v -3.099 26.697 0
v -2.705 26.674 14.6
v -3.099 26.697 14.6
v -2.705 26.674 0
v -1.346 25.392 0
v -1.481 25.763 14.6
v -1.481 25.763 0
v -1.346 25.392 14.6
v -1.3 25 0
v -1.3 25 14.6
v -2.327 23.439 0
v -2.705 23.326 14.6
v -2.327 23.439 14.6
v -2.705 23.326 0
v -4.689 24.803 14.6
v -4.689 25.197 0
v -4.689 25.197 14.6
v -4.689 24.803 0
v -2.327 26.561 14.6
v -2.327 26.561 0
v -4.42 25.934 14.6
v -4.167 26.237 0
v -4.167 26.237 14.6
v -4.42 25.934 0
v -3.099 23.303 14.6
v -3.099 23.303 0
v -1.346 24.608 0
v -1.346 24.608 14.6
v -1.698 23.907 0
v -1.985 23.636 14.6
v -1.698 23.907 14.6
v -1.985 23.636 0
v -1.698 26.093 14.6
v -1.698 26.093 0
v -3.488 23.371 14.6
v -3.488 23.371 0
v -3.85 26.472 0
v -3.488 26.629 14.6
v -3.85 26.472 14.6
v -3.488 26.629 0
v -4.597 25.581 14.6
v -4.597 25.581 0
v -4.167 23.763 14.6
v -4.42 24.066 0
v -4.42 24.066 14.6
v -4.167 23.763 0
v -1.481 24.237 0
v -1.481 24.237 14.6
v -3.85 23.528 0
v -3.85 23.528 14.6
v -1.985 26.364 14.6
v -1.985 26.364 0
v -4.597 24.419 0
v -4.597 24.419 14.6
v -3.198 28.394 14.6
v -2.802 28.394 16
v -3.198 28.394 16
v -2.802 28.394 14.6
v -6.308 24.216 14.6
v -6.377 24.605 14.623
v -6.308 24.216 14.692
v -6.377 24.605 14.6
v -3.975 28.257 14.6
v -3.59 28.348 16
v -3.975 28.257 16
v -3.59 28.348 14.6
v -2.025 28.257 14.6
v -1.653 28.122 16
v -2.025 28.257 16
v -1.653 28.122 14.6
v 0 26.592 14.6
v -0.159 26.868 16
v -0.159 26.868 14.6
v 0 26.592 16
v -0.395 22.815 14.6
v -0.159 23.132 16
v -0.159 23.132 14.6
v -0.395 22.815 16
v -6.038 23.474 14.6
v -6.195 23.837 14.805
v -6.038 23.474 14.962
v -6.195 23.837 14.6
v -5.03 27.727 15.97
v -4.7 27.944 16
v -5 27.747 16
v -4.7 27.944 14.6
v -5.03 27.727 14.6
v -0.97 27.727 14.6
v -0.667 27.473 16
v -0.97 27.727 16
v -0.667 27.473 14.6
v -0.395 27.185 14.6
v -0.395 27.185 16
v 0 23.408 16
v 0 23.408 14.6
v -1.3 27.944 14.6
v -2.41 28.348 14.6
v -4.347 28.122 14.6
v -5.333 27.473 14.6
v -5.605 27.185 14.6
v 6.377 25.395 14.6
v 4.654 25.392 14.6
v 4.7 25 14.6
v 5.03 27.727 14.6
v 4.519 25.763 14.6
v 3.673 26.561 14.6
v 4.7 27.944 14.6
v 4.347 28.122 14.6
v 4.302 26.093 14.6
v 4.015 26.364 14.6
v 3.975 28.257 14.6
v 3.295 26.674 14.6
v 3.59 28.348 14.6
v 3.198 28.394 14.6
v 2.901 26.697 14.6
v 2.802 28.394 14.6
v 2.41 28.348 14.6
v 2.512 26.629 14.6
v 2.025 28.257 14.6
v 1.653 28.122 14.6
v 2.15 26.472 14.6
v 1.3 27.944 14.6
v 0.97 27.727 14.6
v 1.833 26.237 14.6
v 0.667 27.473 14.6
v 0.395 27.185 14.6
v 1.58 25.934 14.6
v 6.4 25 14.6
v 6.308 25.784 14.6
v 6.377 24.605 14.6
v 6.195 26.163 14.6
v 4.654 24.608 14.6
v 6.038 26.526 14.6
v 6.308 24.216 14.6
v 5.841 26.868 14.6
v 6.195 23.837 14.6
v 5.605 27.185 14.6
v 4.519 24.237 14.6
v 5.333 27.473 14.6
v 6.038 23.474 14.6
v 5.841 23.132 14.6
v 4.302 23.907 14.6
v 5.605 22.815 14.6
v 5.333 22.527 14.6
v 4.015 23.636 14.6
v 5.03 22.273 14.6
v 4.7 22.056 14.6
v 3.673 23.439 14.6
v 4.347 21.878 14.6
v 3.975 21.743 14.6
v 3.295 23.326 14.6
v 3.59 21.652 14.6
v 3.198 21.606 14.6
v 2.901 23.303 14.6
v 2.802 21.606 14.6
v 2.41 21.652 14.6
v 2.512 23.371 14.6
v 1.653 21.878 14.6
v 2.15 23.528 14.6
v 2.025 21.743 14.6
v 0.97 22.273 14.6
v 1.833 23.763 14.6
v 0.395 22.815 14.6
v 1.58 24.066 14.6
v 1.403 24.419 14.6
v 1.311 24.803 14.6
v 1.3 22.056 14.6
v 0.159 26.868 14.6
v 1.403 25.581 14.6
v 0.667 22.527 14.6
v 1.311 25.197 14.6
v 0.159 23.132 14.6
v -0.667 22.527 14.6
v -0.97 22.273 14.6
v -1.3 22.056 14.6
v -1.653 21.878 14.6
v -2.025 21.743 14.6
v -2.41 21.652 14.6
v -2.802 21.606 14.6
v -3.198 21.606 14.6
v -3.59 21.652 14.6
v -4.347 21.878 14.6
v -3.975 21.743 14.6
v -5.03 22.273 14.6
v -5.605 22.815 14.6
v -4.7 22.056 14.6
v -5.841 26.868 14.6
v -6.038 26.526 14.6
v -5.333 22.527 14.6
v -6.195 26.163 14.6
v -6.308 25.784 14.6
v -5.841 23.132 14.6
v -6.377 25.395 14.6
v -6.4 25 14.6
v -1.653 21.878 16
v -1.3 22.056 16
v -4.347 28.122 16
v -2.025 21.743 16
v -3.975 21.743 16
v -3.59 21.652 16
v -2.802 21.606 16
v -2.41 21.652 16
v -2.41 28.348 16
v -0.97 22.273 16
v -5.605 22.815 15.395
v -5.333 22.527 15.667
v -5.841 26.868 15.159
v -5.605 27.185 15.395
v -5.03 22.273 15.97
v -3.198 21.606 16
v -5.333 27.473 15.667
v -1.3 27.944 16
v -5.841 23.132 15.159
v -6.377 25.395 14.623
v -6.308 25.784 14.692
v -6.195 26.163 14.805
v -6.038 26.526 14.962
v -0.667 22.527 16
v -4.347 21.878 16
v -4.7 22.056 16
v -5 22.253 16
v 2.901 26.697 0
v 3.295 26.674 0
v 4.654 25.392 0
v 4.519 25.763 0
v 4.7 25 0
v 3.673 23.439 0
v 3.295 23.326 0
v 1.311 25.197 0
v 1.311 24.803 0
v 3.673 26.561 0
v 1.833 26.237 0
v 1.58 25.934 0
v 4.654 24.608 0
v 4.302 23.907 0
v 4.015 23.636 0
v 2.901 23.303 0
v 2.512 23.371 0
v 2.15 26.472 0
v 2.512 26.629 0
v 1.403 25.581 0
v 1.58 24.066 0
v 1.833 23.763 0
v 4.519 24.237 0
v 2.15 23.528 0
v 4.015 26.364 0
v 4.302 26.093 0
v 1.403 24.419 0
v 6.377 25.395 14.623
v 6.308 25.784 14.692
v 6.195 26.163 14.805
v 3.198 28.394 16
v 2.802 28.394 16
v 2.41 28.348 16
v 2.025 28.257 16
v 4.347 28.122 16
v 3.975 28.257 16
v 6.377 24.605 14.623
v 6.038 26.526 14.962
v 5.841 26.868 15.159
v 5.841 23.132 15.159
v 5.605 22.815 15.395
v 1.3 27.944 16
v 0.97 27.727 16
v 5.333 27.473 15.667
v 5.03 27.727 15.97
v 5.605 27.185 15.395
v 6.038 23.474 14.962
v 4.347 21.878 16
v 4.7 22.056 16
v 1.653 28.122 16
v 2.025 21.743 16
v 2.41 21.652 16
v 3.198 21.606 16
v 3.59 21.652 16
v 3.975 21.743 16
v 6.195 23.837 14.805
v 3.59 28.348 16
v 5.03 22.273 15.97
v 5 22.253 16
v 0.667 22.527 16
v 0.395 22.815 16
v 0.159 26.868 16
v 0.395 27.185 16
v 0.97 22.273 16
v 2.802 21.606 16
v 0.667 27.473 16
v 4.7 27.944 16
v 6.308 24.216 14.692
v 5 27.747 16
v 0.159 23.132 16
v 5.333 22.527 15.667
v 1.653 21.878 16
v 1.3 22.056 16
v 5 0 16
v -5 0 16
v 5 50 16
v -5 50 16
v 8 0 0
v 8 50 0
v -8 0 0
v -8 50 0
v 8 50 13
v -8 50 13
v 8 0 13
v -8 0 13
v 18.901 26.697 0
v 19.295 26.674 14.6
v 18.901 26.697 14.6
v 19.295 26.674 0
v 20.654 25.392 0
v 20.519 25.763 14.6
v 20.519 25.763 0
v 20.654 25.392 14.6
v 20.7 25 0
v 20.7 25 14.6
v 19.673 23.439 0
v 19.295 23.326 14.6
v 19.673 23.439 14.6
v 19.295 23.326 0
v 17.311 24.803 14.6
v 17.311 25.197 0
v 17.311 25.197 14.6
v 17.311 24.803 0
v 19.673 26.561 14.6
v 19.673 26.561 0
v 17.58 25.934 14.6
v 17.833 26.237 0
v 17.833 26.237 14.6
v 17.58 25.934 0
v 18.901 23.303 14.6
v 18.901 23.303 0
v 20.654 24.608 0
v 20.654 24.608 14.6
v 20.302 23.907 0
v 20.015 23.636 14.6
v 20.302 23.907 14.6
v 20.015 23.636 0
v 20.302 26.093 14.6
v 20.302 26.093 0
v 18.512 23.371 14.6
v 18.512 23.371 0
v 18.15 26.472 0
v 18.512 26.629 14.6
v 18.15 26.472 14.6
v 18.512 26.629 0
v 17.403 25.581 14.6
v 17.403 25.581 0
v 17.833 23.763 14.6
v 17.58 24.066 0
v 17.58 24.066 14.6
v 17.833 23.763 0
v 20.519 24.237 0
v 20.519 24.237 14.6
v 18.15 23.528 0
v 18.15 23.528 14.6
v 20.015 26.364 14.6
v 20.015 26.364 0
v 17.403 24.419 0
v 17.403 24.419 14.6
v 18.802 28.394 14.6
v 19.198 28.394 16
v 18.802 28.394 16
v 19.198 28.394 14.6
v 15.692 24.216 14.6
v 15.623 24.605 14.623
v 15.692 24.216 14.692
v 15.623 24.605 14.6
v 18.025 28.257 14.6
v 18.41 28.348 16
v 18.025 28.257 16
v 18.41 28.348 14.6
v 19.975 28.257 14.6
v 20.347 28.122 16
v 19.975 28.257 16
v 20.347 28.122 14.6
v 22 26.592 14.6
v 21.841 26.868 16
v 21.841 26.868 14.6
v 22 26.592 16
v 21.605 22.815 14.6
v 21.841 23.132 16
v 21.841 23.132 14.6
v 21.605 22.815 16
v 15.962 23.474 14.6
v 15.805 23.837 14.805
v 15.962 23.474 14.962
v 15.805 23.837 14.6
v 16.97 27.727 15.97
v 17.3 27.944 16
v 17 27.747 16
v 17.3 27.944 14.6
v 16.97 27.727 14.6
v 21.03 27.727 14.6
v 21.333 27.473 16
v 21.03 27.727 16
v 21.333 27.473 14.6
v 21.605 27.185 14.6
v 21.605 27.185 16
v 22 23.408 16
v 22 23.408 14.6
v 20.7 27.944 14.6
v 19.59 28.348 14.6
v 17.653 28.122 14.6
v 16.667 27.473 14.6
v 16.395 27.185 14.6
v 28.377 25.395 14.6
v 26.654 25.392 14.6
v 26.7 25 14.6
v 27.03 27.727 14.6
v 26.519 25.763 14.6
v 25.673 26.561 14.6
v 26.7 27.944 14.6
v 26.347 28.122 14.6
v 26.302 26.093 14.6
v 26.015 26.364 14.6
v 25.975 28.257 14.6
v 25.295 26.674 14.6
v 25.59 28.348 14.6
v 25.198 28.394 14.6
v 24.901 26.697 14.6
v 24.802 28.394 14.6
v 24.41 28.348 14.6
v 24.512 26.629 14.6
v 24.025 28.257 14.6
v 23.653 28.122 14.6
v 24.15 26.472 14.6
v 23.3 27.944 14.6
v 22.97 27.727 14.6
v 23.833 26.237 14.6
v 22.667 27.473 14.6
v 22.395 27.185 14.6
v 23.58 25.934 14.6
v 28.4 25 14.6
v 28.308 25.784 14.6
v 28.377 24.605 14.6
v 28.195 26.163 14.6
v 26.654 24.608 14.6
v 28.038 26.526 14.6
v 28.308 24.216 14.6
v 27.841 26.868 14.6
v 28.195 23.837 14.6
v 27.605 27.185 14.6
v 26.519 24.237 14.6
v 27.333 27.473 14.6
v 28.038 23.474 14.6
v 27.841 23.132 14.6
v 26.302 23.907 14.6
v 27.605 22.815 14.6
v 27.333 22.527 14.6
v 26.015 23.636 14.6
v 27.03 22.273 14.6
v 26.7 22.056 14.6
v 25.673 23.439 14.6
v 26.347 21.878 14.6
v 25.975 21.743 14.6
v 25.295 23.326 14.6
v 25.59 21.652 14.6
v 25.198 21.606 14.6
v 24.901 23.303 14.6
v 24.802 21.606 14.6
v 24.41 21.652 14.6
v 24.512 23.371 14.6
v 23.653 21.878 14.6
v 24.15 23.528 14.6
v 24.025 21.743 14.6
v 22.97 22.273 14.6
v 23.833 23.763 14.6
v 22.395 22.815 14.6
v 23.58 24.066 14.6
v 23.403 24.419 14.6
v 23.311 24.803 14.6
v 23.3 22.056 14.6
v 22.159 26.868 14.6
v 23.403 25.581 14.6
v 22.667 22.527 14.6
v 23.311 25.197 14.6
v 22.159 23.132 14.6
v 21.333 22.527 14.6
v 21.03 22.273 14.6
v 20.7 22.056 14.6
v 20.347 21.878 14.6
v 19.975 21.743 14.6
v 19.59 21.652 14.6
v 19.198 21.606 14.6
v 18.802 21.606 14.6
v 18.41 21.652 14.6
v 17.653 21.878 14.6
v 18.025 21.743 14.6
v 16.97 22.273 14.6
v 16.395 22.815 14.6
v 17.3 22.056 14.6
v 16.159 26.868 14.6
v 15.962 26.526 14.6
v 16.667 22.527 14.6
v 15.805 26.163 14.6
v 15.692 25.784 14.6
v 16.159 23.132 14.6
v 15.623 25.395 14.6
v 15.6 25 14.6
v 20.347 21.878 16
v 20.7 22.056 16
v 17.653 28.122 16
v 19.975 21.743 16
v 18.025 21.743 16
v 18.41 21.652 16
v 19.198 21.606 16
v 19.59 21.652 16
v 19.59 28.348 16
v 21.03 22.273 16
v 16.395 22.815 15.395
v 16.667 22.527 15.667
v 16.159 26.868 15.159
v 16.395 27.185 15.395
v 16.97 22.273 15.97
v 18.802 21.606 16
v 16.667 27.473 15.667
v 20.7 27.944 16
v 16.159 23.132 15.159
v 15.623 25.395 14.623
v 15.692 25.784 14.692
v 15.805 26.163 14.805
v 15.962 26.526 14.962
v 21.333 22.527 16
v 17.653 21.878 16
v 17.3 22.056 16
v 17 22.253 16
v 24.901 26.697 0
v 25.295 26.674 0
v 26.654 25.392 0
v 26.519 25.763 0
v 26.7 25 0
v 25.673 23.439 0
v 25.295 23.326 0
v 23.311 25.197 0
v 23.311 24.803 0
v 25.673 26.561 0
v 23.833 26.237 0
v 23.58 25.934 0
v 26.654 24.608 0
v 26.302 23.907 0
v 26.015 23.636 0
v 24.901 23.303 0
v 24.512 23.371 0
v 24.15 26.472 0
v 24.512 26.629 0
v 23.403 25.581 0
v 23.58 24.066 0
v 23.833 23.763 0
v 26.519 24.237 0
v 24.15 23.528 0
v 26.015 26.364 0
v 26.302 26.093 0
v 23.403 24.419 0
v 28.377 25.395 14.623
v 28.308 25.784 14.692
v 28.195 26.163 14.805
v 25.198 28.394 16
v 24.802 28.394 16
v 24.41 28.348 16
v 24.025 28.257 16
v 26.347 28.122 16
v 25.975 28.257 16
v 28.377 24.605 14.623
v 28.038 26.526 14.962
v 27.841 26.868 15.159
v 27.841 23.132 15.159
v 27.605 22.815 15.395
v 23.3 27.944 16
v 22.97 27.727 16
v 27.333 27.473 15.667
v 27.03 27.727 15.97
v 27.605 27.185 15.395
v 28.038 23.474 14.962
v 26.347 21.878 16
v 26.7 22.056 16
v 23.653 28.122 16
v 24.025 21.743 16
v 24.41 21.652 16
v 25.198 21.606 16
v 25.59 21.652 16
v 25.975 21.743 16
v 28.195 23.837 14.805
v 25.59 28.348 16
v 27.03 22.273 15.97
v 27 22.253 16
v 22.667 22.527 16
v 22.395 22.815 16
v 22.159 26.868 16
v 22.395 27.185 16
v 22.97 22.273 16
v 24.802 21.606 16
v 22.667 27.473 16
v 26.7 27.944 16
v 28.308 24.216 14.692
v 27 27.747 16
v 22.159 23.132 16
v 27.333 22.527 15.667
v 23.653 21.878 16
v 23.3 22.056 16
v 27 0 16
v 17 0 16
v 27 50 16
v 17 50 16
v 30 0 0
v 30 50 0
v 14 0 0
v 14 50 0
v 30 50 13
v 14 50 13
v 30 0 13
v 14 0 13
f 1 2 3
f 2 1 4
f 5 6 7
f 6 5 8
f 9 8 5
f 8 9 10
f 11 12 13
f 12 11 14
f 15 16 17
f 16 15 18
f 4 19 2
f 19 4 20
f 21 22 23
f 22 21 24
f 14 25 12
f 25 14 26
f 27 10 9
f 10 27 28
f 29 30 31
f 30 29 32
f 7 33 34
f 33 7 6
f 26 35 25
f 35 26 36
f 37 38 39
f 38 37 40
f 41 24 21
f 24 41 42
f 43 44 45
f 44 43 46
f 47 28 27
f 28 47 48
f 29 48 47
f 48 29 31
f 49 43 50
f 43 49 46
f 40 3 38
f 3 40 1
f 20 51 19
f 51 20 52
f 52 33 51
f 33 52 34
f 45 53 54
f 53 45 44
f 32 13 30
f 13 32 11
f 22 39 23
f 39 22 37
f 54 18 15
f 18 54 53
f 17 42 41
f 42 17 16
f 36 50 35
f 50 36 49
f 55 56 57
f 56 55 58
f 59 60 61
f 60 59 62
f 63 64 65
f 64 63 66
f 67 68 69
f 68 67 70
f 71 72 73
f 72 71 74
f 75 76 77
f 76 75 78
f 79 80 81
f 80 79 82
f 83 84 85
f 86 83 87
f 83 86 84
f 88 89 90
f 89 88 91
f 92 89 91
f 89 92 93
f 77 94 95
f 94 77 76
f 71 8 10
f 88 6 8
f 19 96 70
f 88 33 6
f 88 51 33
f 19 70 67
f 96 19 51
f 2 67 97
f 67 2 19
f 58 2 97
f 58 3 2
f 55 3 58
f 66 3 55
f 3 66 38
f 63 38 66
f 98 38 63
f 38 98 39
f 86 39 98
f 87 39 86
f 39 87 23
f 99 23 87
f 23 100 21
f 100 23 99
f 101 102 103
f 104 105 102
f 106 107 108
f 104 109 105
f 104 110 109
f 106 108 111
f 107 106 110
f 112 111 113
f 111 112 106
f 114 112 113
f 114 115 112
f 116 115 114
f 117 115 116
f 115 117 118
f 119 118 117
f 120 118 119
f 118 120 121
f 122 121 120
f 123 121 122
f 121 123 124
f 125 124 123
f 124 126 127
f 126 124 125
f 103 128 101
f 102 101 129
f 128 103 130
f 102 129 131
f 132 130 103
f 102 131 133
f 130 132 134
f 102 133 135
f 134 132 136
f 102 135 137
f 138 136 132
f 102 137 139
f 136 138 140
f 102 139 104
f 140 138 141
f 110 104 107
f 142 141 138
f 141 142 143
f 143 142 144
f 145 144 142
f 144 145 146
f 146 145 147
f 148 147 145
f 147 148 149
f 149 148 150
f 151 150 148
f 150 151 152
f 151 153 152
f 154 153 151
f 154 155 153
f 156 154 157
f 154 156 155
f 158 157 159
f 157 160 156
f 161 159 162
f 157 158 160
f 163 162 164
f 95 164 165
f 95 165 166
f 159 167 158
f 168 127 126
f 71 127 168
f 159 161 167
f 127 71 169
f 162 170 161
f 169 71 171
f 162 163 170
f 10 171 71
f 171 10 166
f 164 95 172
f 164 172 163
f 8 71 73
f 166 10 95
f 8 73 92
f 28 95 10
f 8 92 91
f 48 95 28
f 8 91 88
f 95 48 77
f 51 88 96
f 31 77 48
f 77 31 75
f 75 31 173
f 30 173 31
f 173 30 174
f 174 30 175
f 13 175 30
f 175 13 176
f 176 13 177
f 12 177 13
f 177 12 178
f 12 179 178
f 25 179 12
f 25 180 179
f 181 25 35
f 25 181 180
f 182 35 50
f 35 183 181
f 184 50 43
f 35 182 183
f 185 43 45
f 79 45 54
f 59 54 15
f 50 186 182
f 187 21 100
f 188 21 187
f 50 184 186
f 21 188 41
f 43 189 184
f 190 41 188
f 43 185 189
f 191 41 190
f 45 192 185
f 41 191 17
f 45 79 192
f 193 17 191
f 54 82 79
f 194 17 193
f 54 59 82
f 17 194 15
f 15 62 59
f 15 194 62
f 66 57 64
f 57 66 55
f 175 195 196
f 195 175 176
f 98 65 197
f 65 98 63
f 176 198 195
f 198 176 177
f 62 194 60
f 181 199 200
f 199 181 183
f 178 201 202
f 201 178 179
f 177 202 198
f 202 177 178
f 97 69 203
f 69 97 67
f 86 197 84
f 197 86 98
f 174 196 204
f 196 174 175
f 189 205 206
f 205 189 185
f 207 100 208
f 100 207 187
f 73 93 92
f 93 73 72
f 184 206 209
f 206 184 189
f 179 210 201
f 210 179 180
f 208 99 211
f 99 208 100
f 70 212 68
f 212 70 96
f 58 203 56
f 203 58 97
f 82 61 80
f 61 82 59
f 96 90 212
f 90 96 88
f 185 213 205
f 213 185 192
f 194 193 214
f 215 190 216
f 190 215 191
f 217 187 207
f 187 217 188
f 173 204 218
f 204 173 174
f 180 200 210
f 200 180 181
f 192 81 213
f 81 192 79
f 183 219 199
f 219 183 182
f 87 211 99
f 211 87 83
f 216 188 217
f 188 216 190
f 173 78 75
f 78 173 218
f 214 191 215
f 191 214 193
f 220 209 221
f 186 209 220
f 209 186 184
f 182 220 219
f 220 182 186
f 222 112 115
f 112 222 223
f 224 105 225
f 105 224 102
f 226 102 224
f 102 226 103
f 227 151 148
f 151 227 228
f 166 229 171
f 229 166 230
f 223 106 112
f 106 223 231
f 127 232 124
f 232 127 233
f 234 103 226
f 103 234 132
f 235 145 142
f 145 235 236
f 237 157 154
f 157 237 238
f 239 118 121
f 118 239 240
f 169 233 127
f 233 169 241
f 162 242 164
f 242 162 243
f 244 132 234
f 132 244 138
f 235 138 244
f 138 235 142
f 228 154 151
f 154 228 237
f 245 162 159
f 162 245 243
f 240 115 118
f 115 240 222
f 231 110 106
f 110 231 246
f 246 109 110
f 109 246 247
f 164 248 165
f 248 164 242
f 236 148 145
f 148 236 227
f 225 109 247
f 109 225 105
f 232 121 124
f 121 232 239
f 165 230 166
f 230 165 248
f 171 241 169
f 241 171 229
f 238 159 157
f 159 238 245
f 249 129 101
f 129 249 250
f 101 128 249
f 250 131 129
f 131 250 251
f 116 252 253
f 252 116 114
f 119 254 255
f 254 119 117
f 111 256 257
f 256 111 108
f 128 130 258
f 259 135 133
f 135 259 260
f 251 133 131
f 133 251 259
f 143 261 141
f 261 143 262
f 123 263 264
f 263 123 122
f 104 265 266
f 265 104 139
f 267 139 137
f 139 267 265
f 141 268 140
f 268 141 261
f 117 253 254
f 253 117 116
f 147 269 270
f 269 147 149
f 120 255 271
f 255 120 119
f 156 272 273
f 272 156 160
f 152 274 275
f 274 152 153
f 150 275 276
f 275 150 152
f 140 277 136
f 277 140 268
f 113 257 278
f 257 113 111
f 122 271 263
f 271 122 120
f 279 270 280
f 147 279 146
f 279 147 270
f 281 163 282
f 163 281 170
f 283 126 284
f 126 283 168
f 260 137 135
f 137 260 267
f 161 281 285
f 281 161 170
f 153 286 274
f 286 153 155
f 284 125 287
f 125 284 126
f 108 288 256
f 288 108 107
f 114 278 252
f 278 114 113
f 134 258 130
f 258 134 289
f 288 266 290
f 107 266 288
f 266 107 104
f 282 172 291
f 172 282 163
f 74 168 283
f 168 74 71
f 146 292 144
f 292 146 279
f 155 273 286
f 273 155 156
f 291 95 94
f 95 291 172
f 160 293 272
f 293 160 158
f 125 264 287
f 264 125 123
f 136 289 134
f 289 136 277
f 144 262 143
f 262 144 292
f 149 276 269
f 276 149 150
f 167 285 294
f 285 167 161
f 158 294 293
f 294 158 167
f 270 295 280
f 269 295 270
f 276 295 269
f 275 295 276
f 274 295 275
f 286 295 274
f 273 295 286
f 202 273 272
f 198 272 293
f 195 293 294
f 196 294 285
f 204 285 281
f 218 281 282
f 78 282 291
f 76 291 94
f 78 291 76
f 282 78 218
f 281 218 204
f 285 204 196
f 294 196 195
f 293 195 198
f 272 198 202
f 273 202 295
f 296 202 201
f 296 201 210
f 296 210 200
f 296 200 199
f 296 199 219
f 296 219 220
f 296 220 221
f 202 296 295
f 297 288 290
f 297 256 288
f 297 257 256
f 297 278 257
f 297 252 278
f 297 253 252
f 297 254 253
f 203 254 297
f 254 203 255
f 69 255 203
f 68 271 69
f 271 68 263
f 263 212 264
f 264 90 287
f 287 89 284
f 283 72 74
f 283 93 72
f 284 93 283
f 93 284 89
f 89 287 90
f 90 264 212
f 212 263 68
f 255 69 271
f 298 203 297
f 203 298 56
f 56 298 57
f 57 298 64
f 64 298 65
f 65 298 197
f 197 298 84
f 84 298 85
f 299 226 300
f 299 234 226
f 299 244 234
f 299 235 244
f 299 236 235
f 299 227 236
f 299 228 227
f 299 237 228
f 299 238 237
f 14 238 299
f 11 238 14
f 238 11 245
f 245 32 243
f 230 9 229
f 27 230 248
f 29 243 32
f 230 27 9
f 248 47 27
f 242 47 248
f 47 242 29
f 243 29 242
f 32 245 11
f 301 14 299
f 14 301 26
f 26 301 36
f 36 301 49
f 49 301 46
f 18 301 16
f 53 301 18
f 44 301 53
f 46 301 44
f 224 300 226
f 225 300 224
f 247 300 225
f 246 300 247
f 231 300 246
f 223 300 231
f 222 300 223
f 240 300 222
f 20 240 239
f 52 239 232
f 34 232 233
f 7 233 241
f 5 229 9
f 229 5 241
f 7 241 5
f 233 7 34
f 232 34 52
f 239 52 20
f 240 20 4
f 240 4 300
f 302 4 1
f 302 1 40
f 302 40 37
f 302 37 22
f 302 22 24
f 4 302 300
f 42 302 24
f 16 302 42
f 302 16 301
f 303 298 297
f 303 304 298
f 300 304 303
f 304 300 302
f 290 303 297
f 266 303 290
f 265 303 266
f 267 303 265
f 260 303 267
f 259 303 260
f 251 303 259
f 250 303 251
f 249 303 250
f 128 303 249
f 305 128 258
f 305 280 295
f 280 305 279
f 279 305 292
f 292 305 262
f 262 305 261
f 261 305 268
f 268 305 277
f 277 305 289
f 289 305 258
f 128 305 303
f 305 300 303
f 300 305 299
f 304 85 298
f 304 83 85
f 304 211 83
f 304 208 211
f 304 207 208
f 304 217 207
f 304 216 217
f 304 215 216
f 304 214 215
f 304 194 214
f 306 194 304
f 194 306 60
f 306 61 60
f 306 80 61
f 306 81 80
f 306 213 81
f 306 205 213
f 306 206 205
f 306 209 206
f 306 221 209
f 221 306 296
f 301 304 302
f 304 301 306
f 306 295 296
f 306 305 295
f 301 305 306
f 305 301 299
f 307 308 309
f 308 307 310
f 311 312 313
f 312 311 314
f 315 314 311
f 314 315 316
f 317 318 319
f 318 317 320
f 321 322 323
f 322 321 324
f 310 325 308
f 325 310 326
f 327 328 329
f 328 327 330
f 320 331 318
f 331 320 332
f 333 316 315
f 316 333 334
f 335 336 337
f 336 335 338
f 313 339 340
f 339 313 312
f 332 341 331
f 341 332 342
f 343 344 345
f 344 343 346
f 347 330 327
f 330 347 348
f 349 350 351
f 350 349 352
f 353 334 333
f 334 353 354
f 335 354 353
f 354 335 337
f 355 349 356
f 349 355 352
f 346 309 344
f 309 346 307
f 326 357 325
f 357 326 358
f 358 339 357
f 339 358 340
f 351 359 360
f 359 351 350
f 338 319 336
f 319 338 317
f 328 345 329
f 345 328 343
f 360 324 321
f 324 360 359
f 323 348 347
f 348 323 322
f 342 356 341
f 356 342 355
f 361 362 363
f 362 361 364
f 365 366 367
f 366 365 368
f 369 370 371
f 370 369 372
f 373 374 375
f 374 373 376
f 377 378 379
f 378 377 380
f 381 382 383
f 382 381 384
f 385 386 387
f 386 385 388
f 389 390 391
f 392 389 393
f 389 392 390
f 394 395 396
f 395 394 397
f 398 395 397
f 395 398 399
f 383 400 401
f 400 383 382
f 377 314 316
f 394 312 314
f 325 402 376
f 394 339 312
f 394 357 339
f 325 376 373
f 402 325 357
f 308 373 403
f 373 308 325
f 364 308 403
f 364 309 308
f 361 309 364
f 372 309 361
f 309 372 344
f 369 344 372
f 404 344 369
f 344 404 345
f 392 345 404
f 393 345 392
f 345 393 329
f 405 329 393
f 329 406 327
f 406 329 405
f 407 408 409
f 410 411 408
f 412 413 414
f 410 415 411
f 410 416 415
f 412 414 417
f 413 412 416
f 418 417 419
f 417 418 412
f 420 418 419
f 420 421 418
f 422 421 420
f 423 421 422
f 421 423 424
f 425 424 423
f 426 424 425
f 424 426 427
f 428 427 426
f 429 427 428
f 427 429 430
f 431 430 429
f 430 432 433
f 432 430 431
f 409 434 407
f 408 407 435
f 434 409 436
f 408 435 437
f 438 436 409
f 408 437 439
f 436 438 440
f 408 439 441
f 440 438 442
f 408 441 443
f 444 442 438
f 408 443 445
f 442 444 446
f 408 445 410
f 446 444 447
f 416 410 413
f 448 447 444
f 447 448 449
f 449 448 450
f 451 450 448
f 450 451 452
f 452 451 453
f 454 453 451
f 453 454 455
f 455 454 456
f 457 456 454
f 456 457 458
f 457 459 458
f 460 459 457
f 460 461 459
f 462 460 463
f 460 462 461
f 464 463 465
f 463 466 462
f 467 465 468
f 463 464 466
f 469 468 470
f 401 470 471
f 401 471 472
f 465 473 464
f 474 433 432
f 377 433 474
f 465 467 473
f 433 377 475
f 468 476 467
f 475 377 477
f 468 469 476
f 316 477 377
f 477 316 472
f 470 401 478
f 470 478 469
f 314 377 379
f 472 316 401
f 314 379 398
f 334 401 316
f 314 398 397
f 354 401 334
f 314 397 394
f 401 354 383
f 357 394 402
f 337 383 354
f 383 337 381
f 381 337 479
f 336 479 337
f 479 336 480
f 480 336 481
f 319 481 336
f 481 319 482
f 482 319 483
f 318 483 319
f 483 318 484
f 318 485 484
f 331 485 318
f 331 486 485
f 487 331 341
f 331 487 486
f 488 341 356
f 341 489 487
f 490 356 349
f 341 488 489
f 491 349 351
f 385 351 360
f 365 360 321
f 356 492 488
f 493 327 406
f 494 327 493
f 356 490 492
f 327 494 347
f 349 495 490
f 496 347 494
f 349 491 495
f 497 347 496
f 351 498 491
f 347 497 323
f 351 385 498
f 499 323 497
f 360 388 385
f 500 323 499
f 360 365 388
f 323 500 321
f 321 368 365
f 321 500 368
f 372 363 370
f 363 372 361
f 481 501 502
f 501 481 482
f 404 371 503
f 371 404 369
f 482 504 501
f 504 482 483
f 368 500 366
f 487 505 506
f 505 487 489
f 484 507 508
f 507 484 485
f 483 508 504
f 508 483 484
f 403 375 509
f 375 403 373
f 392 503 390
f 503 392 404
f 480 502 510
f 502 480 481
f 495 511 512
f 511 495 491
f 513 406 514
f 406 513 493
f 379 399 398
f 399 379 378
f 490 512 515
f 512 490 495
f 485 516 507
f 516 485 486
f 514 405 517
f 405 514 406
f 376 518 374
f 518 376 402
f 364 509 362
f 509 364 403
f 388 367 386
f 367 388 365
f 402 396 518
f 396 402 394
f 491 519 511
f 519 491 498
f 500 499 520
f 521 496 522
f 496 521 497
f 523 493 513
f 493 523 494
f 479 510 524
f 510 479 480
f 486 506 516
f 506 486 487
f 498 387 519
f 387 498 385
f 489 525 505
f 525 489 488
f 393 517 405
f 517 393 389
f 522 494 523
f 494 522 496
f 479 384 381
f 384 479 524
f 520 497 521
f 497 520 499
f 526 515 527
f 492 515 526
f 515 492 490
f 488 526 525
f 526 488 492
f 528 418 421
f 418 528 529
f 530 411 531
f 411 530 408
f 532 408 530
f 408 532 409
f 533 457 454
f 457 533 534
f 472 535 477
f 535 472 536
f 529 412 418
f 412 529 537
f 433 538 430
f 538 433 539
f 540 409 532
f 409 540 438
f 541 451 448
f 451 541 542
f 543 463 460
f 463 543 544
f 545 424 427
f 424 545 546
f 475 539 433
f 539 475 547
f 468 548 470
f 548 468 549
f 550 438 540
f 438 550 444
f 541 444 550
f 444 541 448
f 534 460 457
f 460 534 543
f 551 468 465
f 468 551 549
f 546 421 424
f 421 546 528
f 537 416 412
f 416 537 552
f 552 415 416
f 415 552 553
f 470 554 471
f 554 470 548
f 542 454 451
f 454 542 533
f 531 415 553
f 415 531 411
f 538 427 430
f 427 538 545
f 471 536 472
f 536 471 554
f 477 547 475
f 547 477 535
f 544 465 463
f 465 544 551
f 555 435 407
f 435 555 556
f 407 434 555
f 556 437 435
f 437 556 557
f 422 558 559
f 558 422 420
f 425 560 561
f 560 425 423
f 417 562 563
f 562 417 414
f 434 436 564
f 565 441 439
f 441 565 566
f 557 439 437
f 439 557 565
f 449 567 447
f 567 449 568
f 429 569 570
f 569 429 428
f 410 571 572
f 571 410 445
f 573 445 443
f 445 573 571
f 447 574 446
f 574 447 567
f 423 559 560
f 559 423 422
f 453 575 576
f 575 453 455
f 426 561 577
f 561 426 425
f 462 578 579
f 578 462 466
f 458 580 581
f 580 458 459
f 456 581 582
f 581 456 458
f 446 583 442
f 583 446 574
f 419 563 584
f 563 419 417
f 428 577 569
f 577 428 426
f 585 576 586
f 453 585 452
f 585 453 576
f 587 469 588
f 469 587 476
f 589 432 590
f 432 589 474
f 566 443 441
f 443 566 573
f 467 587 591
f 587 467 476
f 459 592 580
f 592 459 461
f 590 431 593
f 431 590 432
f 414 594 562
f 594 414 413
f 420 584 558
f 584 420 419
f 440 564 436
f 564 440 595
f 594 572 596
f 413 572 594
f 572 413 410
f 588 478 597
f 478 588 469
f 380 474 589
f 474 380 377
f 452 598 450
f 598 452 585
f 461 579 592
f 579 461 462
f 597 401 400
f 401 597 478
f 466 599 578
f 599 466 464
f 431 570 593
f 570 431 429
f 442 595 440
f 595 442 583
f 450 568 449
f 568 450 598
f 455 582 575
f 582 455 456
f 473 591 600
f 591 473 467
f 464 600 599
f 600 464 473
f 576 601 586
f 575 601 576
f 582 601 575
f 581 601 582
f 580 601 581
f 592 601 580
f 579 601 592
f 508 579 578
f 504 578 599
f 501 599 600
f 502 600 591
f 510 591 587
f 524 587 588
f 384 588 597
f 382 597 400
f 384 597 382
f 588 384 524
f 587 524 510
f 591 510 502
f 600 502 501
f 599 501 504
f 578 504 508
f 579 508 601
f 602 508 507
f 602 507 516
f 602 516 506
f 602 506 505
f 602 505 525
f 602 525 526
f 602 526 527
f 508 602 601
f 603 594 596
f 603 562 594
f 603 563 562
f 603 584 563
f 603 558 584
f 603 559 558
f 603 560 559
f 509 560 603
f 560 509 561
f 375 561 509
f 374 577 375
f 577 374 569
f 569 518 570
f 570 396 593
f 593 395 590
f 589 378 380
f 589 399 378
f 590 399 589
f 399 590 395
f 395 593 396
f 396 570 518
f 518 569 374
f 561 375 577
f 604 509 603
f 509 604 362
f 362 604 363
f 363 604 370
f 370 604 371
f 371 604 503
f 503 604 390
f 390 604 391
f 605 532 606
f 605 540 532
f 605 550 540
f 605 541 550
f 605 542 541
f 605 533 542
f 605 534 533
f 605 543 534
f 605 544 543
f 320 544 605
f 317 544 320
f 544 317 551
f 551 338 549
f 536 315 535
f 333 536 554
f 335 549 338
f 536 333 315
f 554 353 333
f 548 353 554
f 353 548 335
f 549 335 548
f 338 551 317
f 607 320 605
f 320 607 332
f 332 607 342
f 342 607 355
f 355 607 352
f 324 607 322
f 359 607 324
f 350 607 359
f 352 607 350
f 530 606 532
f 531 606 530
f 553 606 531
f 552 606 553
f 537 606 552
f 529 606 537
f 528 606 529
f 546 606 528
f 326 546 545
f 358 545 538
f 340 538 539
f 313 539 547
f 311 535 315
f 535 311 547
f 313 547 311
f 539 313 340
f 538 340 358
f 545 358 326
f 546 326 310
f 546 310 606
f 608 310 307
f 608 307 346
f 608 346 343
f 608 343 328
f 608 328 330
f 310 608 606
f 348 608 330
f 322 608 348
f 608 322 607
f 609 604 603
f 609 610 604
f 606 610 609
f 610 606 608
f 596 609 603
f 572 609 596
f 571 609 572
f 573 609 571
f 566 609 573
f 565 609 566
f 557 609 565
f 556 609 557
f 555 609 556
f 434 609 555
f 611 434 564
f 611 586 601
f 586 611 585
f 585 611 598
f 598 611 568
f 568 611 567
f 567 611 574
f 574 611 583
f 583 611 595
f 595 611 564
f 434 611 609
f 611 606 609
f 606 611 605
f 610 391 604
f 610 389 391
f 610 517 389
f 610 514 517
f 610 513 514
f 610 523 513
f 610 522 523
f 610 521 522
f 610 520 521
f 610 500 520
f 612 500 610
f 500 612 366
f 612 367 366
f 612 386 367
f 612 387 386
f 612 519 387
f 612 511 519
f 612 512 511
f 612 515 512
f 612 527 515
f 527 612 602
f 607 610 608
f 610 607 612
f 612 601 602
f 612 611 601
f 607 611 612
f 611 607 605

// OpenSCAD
/* =====================================================
   Compute bay kit — UniFi Toolless Mini Rack
   =====================================================
   Parts for laying out the compute bay (the 3U on the fixed
   shelf, UACC-Rack-Shelf-TL) flat, in two rows with air
   between everything:

     front row  GMKtec M8 · two Mac mini M4 stacked on a
                riser · Mac mini M4
     back row   Geekom A9 Mega · Minisforum MS-A2

   The power bricks and the HDHomeRun live in the brick caddy
   at the bottom back of the rack (rack_brick_caddy.scad).

   Why this layout: the fan lid's fans and clips hang 18.2 mm
   into the bay, so under a fan there's about 122 mm, not
   141. An M8 on a bridge over the MS-A2 would stand 134 mm.
   Two minis stacked with a 10 mm gap stand 116 mm, and the
   freed spot takes the M8 flat. Also, the rack's side
   ledges stick 19.7 mm in at every 48 mm, so nothing taller
   than 46 mm may come within 22 mm of a side slat (the
   ledge plus a cable clip's spine): every device stays
   inside |x| ≤ 199.5.

   Parts:
     fin     spacer between two front-row devices (17 mm
             gap), pinned into the shelf's perforations
     deck    the riser's top: carries the upper Mac mini on
             two ribs under its foot, so the intake ring
             round the foot stays open; corner lips locate it
     post    four legs for the deck, standing outside the
             lower mini's corners
     clip    a cable clip that pushes onto a side ledge and
             holds a bundle in the 19.7 mm band between the
             ledge edge and the slat, out of the airflow
     pins    loose pins for the fins (the shelf's holes are
             Ø3.5 on a 6.0 × 5.2 staggered grid)

   Coordinates: X across the rack (centred), Y back from the
   front of the shelf, Z up from the shelf top.
   ===================================================== */

$fa = 2;
$fs = 0.4;

/* ── Selection (set by presets) ─────────────────────── */
part = "fins";      // [fins, deck, posts, clips, pins, fit_test, none]

/* ── Devices (mm: width × depth × height) ───────────── */
mini   = [127, 127, 50];      // Mac mini M4
m8     = [110, 110, 65];      // GMKtec NucBox M8
a9     = [171, 171, 71];      // Geekom A9 Mega
msa2   = [196, 189, 48];      // Minisforum MS-A2

/* ── Layout (bay frame) ─────────────────────────────── */
gap      = 17;                // between front-row devices (a fin's width + 1)
row_x0   = -71.5;             // left edge of the stacked minis
row_y    = 76;                // front row's front edge (inside the perforated field)
channel  = 26;                // air channel between the rows (the back row then
                              // ends 42 mm short of the shelf's back, clear of
                              // the AC Infinity, 38 mm deep)
back_gap = 30;                // between the A9 and the MS-A2
side_max = 199.5;             // nothing tall beyond this |x|

/* ── Fin ────────────────────────────────────────────── */
fin_w    = gap - 1;           // 16
fin_len  = 50;
fin_h    = 16;
fin_cham = 3;

/* ── Riser ──────────────────────────────────────────── */
riser_gap  = 10;              // lower mini top to deck underside
mini_clear = 1.0;             // per side, round the minis
post_w     = 8;
rail_w     = 8;
rail_h     = 4;
rib_w      = 8;
rib_h      = 6;               // ribs stand 2 mm proud of the rails
rib_x      = 26;              // ribs at ±26: under the M4's foot
lip_h      = 4;
lip_len    = 18;
lip_t      = 2.4;
peg_d      = 4.0;
peg_len    = 4;
peg_clear  = 0.2;

/* ── Ledge clip ─────────────────────────────────────── */
ledge_t     = 1.65;
ledge_in    = 19.7;           // ledge edge to slat
clip_v      = 12;             // clip thickness along the ledge
spine_t     = 2;
jaw_len     = 11;
jaw_t       = 2.4;
jaw_gap     = 1.85;           // ledge 1.65 + a little (1.75 spread the jaws)
bump        = 0.1;            // friction bump on the top jaw (0.25 printed tight)
hook_u      = 8.8;            // hook centre out from the ledge edge (ring
                              // stays inside the 19.7 mm band)
hook_z      = -15;            // hook centre below the ledge top
hook_r      = 8;              // inner radius: a bundle up to ~16 mm
hook_wall   = 2;
hook_mouth  = 7;              // opening at the bottom, toward the wall

/* ── Shelf pins (same as unifi_shelf_dock) ──────────── */
hole_pitch = 6.0;
pin_d      = 3.1;
pin_hole   = 3.4;
pin_head_d = 6.2;
pin_head_t = 1.2;
cbore_d    = 6.8;
cbore_t    = 1.4;
pin_peg    = 4.0;             // how far a pin pokes below the part (into the shelf)
pin_count  = 6;

eps = 0.01;

/* ── Derived layout ─────────────────────────────────── */
stack_x  = row_x0 + mini[0] / 2;                     // stacked minis' centre
m8_x     = row_x0 - gap - m8[0] / 2;
mini_x   = row_x0 + mini[0] + gap + mini[0] / 2;
fin_x    = [row_x0 - gap / 2, row_x0 + mini[0] + gap / 2];
back_y   = row_y + mini[1] + channel;
a9_x     = -side_max + a9[0] / 2 + 1;
msa2_x   = a9_x + a9[0] / 2 + back_gap + msa2[0] / 2;
deck_in  = mini[0] / 2 + mini_clear;                 // half-width inside the posts
deck_out = deck_in + post_w;
deck_z   = mini[2] + riser_gap;                      // deck underside
upper_z  = deck_z + rib_h;                           // where the upper mini sits

/* ── Fin ────────────────────────────────────────────── */
module fin() {
    difference() {
        hull() {
            translate([-fin_w / 2, 0, 0]) cube([fin_w, fin_len, fin_h - fin_cham]);
            translate([-fin_w / 2 + fin_cham, 0, 0]) cube([fin_w - 2 * fin_cham, fin_len, fin_h]);
        }
        // two pins on one perforation row, one hole pitch apart
        for (x = [-hole_pitch / 2, hole_pitch / 2]) translate([x, fin_len / 2, 0]) {
            translate([0, 0, -1]) cylinder(d = pin_hole, h = fin_h + 2);
            translate([0, 0, fin_h - cbore_t]) cylinder(d = cbore_d, h = cbore_t + 1);
        }
    }
}

/* ── Riser ──────────────────────────────────────────── */
// Deck, as printed: rails and ribs on the bed, lips up. In place it's
// the same way up (z = 0 here is the deck's underside).
module deck() {
    difference() {
        union() {
            // perimeter rails over the posts
            difference() {
                translate([-deck_out, -deck_out, 0]) cube([2 * deck_out, 2 * deck_out, rail_h]);
                translate([-deck_in, -deck_in, -1]) cube([2 * deck_in, 2 * deck_in, rail_h + 2]);
            }
            // two ribs under the upper mini's foot
            for (x = [-rib_x, rib_x]) translate([x - rib_w / 2, -deck_in - eps, 0])
                cube([rib_w, 2 * deck_in + 2 * eps, rib_h]);
            // corner lips locate the upper mini
            for (sx = [-1, 1], sy = [-1, 1]) mirror([sx < 0 ? 1 : 0, 0, 0]) mirror([0, sy < 0 ? 1 : 0, 0]) {
                translate([deck_in, deck_in - lip_len, 0]) cube([lip_t, lip_len, rib_h + lip_h]);
                translate([deck_in - lip_len, deck_in, 0]) cube([lip_len + lip_t, lip_t, rib_h + lip_h]);
            }
        }
        // sockets for the post pegs
        for (sx = [-1, 1], sy = [-1, 1])
            translate([sx * (deck_in + post_w / 2), sy * (deck_in + post_w / 2), -1])
                cylinder(d = peg_d + 2 * peg_clear, h = peg_len + 1.5);
    }
}

// A post, standing: it reaches the deck's underside and pegs into it.
module post() {
    translate([-post_w / 2, -post_w / 2, 0]) cube([post_w, post_w, deck_z]);
    translate([0, 0, deck_z - eps]) cylinder(d = peg_d, h = peg_len + eps);
}

/* ── Ledge clip ─────────────────────────────────────── */
// Profile in (u, z): u out from the ledge edge toward the slat, z up
// from the ledge top. Extruded clip_v along the ledge.
module clip_profile() {
    difference() {
        union() {
            // spine, just inside the ledge edge
            let(z0 = hook_z - hook_r - hook_wall, z1 = jaw_gap + jaw_t)
                translate([-spine_t, z0]) square([spine_t, z1 - z0]);
            // top jaw (over the ledge) with its friction bump
            translate([0, jaw_gap]) square([jaw_len, jaw_t]);
            translate([jaw_len - 3, jaw_gap - bump]) square([2, bump + eps]);
            // bottom jaw
            translate([0, -jaw_t]) square([jaw_len, jaw_t]);
            // hook ring
            translate([hook_u, hook_z]) circle(r = hook_r + hook_wall);
            // web from the spine to the ring
            translate([-spine_t, hook_z]) square([hook_u, hook_r + hook_wall]);
        }
        translate([hook_u, hook_z]) circle(r = hook_r);
        // mouth: open at the bottom, toward the wall, so a bundle pushes in
        translate([hook_u, hook_z]) rotate(-60) translate([0, -hook_mouth / 2]) square([hook_r + hook_wall + 1, hook_mouth]);
        // keep the ring clear of the slat
        translate([ledge_in - 0.8, -60]) square([10, 80]);
    }
}

module clip() { linear_extrude(clip_v) clip_profile(); }

/* ── Pins ───────────────────────────────────────────── */
// The shaft starts under the head: it spans the fin below the
// counterbore, then pokes pin_peg out the bottom, tapered at the tip.
module pin() {
    shaft = fin_h - cbore_t + pin_peg;
    cylinder(d = pin_head_d, h = pin_head_t);
    translate([0, 0, pin_head_t - eps]) {
        cylinder(d = pin_d, h = shaft - 0.5 + eps);
        translate([0, 0, shaft - 0.5]) cylinder(d1 = pin_d, d2 = pin_d - 1, h = 0.5);
    }
}

/* ── Layout helpers (scenes include this file) ──────── */
module at_fins() {
    for (x = fin_x) for (y = [row_y + (mini[1] - fin_len) / 2]) translate([x, y, 0]) children();
}

module riser_in_place() {
    translate([stack_x, row_y + mini[1] / 2, 0]) {
        for (sx = [-1, 1], sy = [-1, 1])
            translate([sx * (deck_in + post_w / 2), sy * (deck_in + post_w / 2), 0]) post();
        translate([0, 0, deck_z]) deck();
    }
}

/* ── Fit test ───────────────────────────────────────── */
module fit_test() {
    clip();
    // a slice of fin with both pin holes
    translate([30, 0, 0]) intersection() {
        translate([0, -fin_len / 2 + 10, 0]) fin();
        translate([-fin_w, -10, -1]) cube([2 * fin_w, 40, fin_h + 2]);
    }
    translate([55, 0, 0]) pin();
}

/* ── Output ─────────────────────────────────────────── */
if (part == "fins") {
    for (i = [0 : 1]) translate([i * (fin_w + 6), 0, 0]) fin();
} else if (part == "deck") {
    deck();
} else if (part == "posts") {
    for (i = [0 : 3]) translate([i * (post_w + 6), 0, 0]) post();
} else if (part == "clips") {
    for (i = [0 : 5]) translate([(i % 3) * 36, floor(i / 3) * 32, 0]) clip();
} else if (part == "pins") {
    for (i = [0 : pin_count - 1]) translate([i * (pin_head_d + 3), 0, 0]) pin();
} else if (part == "fit_test") {
    fit_test();
}
